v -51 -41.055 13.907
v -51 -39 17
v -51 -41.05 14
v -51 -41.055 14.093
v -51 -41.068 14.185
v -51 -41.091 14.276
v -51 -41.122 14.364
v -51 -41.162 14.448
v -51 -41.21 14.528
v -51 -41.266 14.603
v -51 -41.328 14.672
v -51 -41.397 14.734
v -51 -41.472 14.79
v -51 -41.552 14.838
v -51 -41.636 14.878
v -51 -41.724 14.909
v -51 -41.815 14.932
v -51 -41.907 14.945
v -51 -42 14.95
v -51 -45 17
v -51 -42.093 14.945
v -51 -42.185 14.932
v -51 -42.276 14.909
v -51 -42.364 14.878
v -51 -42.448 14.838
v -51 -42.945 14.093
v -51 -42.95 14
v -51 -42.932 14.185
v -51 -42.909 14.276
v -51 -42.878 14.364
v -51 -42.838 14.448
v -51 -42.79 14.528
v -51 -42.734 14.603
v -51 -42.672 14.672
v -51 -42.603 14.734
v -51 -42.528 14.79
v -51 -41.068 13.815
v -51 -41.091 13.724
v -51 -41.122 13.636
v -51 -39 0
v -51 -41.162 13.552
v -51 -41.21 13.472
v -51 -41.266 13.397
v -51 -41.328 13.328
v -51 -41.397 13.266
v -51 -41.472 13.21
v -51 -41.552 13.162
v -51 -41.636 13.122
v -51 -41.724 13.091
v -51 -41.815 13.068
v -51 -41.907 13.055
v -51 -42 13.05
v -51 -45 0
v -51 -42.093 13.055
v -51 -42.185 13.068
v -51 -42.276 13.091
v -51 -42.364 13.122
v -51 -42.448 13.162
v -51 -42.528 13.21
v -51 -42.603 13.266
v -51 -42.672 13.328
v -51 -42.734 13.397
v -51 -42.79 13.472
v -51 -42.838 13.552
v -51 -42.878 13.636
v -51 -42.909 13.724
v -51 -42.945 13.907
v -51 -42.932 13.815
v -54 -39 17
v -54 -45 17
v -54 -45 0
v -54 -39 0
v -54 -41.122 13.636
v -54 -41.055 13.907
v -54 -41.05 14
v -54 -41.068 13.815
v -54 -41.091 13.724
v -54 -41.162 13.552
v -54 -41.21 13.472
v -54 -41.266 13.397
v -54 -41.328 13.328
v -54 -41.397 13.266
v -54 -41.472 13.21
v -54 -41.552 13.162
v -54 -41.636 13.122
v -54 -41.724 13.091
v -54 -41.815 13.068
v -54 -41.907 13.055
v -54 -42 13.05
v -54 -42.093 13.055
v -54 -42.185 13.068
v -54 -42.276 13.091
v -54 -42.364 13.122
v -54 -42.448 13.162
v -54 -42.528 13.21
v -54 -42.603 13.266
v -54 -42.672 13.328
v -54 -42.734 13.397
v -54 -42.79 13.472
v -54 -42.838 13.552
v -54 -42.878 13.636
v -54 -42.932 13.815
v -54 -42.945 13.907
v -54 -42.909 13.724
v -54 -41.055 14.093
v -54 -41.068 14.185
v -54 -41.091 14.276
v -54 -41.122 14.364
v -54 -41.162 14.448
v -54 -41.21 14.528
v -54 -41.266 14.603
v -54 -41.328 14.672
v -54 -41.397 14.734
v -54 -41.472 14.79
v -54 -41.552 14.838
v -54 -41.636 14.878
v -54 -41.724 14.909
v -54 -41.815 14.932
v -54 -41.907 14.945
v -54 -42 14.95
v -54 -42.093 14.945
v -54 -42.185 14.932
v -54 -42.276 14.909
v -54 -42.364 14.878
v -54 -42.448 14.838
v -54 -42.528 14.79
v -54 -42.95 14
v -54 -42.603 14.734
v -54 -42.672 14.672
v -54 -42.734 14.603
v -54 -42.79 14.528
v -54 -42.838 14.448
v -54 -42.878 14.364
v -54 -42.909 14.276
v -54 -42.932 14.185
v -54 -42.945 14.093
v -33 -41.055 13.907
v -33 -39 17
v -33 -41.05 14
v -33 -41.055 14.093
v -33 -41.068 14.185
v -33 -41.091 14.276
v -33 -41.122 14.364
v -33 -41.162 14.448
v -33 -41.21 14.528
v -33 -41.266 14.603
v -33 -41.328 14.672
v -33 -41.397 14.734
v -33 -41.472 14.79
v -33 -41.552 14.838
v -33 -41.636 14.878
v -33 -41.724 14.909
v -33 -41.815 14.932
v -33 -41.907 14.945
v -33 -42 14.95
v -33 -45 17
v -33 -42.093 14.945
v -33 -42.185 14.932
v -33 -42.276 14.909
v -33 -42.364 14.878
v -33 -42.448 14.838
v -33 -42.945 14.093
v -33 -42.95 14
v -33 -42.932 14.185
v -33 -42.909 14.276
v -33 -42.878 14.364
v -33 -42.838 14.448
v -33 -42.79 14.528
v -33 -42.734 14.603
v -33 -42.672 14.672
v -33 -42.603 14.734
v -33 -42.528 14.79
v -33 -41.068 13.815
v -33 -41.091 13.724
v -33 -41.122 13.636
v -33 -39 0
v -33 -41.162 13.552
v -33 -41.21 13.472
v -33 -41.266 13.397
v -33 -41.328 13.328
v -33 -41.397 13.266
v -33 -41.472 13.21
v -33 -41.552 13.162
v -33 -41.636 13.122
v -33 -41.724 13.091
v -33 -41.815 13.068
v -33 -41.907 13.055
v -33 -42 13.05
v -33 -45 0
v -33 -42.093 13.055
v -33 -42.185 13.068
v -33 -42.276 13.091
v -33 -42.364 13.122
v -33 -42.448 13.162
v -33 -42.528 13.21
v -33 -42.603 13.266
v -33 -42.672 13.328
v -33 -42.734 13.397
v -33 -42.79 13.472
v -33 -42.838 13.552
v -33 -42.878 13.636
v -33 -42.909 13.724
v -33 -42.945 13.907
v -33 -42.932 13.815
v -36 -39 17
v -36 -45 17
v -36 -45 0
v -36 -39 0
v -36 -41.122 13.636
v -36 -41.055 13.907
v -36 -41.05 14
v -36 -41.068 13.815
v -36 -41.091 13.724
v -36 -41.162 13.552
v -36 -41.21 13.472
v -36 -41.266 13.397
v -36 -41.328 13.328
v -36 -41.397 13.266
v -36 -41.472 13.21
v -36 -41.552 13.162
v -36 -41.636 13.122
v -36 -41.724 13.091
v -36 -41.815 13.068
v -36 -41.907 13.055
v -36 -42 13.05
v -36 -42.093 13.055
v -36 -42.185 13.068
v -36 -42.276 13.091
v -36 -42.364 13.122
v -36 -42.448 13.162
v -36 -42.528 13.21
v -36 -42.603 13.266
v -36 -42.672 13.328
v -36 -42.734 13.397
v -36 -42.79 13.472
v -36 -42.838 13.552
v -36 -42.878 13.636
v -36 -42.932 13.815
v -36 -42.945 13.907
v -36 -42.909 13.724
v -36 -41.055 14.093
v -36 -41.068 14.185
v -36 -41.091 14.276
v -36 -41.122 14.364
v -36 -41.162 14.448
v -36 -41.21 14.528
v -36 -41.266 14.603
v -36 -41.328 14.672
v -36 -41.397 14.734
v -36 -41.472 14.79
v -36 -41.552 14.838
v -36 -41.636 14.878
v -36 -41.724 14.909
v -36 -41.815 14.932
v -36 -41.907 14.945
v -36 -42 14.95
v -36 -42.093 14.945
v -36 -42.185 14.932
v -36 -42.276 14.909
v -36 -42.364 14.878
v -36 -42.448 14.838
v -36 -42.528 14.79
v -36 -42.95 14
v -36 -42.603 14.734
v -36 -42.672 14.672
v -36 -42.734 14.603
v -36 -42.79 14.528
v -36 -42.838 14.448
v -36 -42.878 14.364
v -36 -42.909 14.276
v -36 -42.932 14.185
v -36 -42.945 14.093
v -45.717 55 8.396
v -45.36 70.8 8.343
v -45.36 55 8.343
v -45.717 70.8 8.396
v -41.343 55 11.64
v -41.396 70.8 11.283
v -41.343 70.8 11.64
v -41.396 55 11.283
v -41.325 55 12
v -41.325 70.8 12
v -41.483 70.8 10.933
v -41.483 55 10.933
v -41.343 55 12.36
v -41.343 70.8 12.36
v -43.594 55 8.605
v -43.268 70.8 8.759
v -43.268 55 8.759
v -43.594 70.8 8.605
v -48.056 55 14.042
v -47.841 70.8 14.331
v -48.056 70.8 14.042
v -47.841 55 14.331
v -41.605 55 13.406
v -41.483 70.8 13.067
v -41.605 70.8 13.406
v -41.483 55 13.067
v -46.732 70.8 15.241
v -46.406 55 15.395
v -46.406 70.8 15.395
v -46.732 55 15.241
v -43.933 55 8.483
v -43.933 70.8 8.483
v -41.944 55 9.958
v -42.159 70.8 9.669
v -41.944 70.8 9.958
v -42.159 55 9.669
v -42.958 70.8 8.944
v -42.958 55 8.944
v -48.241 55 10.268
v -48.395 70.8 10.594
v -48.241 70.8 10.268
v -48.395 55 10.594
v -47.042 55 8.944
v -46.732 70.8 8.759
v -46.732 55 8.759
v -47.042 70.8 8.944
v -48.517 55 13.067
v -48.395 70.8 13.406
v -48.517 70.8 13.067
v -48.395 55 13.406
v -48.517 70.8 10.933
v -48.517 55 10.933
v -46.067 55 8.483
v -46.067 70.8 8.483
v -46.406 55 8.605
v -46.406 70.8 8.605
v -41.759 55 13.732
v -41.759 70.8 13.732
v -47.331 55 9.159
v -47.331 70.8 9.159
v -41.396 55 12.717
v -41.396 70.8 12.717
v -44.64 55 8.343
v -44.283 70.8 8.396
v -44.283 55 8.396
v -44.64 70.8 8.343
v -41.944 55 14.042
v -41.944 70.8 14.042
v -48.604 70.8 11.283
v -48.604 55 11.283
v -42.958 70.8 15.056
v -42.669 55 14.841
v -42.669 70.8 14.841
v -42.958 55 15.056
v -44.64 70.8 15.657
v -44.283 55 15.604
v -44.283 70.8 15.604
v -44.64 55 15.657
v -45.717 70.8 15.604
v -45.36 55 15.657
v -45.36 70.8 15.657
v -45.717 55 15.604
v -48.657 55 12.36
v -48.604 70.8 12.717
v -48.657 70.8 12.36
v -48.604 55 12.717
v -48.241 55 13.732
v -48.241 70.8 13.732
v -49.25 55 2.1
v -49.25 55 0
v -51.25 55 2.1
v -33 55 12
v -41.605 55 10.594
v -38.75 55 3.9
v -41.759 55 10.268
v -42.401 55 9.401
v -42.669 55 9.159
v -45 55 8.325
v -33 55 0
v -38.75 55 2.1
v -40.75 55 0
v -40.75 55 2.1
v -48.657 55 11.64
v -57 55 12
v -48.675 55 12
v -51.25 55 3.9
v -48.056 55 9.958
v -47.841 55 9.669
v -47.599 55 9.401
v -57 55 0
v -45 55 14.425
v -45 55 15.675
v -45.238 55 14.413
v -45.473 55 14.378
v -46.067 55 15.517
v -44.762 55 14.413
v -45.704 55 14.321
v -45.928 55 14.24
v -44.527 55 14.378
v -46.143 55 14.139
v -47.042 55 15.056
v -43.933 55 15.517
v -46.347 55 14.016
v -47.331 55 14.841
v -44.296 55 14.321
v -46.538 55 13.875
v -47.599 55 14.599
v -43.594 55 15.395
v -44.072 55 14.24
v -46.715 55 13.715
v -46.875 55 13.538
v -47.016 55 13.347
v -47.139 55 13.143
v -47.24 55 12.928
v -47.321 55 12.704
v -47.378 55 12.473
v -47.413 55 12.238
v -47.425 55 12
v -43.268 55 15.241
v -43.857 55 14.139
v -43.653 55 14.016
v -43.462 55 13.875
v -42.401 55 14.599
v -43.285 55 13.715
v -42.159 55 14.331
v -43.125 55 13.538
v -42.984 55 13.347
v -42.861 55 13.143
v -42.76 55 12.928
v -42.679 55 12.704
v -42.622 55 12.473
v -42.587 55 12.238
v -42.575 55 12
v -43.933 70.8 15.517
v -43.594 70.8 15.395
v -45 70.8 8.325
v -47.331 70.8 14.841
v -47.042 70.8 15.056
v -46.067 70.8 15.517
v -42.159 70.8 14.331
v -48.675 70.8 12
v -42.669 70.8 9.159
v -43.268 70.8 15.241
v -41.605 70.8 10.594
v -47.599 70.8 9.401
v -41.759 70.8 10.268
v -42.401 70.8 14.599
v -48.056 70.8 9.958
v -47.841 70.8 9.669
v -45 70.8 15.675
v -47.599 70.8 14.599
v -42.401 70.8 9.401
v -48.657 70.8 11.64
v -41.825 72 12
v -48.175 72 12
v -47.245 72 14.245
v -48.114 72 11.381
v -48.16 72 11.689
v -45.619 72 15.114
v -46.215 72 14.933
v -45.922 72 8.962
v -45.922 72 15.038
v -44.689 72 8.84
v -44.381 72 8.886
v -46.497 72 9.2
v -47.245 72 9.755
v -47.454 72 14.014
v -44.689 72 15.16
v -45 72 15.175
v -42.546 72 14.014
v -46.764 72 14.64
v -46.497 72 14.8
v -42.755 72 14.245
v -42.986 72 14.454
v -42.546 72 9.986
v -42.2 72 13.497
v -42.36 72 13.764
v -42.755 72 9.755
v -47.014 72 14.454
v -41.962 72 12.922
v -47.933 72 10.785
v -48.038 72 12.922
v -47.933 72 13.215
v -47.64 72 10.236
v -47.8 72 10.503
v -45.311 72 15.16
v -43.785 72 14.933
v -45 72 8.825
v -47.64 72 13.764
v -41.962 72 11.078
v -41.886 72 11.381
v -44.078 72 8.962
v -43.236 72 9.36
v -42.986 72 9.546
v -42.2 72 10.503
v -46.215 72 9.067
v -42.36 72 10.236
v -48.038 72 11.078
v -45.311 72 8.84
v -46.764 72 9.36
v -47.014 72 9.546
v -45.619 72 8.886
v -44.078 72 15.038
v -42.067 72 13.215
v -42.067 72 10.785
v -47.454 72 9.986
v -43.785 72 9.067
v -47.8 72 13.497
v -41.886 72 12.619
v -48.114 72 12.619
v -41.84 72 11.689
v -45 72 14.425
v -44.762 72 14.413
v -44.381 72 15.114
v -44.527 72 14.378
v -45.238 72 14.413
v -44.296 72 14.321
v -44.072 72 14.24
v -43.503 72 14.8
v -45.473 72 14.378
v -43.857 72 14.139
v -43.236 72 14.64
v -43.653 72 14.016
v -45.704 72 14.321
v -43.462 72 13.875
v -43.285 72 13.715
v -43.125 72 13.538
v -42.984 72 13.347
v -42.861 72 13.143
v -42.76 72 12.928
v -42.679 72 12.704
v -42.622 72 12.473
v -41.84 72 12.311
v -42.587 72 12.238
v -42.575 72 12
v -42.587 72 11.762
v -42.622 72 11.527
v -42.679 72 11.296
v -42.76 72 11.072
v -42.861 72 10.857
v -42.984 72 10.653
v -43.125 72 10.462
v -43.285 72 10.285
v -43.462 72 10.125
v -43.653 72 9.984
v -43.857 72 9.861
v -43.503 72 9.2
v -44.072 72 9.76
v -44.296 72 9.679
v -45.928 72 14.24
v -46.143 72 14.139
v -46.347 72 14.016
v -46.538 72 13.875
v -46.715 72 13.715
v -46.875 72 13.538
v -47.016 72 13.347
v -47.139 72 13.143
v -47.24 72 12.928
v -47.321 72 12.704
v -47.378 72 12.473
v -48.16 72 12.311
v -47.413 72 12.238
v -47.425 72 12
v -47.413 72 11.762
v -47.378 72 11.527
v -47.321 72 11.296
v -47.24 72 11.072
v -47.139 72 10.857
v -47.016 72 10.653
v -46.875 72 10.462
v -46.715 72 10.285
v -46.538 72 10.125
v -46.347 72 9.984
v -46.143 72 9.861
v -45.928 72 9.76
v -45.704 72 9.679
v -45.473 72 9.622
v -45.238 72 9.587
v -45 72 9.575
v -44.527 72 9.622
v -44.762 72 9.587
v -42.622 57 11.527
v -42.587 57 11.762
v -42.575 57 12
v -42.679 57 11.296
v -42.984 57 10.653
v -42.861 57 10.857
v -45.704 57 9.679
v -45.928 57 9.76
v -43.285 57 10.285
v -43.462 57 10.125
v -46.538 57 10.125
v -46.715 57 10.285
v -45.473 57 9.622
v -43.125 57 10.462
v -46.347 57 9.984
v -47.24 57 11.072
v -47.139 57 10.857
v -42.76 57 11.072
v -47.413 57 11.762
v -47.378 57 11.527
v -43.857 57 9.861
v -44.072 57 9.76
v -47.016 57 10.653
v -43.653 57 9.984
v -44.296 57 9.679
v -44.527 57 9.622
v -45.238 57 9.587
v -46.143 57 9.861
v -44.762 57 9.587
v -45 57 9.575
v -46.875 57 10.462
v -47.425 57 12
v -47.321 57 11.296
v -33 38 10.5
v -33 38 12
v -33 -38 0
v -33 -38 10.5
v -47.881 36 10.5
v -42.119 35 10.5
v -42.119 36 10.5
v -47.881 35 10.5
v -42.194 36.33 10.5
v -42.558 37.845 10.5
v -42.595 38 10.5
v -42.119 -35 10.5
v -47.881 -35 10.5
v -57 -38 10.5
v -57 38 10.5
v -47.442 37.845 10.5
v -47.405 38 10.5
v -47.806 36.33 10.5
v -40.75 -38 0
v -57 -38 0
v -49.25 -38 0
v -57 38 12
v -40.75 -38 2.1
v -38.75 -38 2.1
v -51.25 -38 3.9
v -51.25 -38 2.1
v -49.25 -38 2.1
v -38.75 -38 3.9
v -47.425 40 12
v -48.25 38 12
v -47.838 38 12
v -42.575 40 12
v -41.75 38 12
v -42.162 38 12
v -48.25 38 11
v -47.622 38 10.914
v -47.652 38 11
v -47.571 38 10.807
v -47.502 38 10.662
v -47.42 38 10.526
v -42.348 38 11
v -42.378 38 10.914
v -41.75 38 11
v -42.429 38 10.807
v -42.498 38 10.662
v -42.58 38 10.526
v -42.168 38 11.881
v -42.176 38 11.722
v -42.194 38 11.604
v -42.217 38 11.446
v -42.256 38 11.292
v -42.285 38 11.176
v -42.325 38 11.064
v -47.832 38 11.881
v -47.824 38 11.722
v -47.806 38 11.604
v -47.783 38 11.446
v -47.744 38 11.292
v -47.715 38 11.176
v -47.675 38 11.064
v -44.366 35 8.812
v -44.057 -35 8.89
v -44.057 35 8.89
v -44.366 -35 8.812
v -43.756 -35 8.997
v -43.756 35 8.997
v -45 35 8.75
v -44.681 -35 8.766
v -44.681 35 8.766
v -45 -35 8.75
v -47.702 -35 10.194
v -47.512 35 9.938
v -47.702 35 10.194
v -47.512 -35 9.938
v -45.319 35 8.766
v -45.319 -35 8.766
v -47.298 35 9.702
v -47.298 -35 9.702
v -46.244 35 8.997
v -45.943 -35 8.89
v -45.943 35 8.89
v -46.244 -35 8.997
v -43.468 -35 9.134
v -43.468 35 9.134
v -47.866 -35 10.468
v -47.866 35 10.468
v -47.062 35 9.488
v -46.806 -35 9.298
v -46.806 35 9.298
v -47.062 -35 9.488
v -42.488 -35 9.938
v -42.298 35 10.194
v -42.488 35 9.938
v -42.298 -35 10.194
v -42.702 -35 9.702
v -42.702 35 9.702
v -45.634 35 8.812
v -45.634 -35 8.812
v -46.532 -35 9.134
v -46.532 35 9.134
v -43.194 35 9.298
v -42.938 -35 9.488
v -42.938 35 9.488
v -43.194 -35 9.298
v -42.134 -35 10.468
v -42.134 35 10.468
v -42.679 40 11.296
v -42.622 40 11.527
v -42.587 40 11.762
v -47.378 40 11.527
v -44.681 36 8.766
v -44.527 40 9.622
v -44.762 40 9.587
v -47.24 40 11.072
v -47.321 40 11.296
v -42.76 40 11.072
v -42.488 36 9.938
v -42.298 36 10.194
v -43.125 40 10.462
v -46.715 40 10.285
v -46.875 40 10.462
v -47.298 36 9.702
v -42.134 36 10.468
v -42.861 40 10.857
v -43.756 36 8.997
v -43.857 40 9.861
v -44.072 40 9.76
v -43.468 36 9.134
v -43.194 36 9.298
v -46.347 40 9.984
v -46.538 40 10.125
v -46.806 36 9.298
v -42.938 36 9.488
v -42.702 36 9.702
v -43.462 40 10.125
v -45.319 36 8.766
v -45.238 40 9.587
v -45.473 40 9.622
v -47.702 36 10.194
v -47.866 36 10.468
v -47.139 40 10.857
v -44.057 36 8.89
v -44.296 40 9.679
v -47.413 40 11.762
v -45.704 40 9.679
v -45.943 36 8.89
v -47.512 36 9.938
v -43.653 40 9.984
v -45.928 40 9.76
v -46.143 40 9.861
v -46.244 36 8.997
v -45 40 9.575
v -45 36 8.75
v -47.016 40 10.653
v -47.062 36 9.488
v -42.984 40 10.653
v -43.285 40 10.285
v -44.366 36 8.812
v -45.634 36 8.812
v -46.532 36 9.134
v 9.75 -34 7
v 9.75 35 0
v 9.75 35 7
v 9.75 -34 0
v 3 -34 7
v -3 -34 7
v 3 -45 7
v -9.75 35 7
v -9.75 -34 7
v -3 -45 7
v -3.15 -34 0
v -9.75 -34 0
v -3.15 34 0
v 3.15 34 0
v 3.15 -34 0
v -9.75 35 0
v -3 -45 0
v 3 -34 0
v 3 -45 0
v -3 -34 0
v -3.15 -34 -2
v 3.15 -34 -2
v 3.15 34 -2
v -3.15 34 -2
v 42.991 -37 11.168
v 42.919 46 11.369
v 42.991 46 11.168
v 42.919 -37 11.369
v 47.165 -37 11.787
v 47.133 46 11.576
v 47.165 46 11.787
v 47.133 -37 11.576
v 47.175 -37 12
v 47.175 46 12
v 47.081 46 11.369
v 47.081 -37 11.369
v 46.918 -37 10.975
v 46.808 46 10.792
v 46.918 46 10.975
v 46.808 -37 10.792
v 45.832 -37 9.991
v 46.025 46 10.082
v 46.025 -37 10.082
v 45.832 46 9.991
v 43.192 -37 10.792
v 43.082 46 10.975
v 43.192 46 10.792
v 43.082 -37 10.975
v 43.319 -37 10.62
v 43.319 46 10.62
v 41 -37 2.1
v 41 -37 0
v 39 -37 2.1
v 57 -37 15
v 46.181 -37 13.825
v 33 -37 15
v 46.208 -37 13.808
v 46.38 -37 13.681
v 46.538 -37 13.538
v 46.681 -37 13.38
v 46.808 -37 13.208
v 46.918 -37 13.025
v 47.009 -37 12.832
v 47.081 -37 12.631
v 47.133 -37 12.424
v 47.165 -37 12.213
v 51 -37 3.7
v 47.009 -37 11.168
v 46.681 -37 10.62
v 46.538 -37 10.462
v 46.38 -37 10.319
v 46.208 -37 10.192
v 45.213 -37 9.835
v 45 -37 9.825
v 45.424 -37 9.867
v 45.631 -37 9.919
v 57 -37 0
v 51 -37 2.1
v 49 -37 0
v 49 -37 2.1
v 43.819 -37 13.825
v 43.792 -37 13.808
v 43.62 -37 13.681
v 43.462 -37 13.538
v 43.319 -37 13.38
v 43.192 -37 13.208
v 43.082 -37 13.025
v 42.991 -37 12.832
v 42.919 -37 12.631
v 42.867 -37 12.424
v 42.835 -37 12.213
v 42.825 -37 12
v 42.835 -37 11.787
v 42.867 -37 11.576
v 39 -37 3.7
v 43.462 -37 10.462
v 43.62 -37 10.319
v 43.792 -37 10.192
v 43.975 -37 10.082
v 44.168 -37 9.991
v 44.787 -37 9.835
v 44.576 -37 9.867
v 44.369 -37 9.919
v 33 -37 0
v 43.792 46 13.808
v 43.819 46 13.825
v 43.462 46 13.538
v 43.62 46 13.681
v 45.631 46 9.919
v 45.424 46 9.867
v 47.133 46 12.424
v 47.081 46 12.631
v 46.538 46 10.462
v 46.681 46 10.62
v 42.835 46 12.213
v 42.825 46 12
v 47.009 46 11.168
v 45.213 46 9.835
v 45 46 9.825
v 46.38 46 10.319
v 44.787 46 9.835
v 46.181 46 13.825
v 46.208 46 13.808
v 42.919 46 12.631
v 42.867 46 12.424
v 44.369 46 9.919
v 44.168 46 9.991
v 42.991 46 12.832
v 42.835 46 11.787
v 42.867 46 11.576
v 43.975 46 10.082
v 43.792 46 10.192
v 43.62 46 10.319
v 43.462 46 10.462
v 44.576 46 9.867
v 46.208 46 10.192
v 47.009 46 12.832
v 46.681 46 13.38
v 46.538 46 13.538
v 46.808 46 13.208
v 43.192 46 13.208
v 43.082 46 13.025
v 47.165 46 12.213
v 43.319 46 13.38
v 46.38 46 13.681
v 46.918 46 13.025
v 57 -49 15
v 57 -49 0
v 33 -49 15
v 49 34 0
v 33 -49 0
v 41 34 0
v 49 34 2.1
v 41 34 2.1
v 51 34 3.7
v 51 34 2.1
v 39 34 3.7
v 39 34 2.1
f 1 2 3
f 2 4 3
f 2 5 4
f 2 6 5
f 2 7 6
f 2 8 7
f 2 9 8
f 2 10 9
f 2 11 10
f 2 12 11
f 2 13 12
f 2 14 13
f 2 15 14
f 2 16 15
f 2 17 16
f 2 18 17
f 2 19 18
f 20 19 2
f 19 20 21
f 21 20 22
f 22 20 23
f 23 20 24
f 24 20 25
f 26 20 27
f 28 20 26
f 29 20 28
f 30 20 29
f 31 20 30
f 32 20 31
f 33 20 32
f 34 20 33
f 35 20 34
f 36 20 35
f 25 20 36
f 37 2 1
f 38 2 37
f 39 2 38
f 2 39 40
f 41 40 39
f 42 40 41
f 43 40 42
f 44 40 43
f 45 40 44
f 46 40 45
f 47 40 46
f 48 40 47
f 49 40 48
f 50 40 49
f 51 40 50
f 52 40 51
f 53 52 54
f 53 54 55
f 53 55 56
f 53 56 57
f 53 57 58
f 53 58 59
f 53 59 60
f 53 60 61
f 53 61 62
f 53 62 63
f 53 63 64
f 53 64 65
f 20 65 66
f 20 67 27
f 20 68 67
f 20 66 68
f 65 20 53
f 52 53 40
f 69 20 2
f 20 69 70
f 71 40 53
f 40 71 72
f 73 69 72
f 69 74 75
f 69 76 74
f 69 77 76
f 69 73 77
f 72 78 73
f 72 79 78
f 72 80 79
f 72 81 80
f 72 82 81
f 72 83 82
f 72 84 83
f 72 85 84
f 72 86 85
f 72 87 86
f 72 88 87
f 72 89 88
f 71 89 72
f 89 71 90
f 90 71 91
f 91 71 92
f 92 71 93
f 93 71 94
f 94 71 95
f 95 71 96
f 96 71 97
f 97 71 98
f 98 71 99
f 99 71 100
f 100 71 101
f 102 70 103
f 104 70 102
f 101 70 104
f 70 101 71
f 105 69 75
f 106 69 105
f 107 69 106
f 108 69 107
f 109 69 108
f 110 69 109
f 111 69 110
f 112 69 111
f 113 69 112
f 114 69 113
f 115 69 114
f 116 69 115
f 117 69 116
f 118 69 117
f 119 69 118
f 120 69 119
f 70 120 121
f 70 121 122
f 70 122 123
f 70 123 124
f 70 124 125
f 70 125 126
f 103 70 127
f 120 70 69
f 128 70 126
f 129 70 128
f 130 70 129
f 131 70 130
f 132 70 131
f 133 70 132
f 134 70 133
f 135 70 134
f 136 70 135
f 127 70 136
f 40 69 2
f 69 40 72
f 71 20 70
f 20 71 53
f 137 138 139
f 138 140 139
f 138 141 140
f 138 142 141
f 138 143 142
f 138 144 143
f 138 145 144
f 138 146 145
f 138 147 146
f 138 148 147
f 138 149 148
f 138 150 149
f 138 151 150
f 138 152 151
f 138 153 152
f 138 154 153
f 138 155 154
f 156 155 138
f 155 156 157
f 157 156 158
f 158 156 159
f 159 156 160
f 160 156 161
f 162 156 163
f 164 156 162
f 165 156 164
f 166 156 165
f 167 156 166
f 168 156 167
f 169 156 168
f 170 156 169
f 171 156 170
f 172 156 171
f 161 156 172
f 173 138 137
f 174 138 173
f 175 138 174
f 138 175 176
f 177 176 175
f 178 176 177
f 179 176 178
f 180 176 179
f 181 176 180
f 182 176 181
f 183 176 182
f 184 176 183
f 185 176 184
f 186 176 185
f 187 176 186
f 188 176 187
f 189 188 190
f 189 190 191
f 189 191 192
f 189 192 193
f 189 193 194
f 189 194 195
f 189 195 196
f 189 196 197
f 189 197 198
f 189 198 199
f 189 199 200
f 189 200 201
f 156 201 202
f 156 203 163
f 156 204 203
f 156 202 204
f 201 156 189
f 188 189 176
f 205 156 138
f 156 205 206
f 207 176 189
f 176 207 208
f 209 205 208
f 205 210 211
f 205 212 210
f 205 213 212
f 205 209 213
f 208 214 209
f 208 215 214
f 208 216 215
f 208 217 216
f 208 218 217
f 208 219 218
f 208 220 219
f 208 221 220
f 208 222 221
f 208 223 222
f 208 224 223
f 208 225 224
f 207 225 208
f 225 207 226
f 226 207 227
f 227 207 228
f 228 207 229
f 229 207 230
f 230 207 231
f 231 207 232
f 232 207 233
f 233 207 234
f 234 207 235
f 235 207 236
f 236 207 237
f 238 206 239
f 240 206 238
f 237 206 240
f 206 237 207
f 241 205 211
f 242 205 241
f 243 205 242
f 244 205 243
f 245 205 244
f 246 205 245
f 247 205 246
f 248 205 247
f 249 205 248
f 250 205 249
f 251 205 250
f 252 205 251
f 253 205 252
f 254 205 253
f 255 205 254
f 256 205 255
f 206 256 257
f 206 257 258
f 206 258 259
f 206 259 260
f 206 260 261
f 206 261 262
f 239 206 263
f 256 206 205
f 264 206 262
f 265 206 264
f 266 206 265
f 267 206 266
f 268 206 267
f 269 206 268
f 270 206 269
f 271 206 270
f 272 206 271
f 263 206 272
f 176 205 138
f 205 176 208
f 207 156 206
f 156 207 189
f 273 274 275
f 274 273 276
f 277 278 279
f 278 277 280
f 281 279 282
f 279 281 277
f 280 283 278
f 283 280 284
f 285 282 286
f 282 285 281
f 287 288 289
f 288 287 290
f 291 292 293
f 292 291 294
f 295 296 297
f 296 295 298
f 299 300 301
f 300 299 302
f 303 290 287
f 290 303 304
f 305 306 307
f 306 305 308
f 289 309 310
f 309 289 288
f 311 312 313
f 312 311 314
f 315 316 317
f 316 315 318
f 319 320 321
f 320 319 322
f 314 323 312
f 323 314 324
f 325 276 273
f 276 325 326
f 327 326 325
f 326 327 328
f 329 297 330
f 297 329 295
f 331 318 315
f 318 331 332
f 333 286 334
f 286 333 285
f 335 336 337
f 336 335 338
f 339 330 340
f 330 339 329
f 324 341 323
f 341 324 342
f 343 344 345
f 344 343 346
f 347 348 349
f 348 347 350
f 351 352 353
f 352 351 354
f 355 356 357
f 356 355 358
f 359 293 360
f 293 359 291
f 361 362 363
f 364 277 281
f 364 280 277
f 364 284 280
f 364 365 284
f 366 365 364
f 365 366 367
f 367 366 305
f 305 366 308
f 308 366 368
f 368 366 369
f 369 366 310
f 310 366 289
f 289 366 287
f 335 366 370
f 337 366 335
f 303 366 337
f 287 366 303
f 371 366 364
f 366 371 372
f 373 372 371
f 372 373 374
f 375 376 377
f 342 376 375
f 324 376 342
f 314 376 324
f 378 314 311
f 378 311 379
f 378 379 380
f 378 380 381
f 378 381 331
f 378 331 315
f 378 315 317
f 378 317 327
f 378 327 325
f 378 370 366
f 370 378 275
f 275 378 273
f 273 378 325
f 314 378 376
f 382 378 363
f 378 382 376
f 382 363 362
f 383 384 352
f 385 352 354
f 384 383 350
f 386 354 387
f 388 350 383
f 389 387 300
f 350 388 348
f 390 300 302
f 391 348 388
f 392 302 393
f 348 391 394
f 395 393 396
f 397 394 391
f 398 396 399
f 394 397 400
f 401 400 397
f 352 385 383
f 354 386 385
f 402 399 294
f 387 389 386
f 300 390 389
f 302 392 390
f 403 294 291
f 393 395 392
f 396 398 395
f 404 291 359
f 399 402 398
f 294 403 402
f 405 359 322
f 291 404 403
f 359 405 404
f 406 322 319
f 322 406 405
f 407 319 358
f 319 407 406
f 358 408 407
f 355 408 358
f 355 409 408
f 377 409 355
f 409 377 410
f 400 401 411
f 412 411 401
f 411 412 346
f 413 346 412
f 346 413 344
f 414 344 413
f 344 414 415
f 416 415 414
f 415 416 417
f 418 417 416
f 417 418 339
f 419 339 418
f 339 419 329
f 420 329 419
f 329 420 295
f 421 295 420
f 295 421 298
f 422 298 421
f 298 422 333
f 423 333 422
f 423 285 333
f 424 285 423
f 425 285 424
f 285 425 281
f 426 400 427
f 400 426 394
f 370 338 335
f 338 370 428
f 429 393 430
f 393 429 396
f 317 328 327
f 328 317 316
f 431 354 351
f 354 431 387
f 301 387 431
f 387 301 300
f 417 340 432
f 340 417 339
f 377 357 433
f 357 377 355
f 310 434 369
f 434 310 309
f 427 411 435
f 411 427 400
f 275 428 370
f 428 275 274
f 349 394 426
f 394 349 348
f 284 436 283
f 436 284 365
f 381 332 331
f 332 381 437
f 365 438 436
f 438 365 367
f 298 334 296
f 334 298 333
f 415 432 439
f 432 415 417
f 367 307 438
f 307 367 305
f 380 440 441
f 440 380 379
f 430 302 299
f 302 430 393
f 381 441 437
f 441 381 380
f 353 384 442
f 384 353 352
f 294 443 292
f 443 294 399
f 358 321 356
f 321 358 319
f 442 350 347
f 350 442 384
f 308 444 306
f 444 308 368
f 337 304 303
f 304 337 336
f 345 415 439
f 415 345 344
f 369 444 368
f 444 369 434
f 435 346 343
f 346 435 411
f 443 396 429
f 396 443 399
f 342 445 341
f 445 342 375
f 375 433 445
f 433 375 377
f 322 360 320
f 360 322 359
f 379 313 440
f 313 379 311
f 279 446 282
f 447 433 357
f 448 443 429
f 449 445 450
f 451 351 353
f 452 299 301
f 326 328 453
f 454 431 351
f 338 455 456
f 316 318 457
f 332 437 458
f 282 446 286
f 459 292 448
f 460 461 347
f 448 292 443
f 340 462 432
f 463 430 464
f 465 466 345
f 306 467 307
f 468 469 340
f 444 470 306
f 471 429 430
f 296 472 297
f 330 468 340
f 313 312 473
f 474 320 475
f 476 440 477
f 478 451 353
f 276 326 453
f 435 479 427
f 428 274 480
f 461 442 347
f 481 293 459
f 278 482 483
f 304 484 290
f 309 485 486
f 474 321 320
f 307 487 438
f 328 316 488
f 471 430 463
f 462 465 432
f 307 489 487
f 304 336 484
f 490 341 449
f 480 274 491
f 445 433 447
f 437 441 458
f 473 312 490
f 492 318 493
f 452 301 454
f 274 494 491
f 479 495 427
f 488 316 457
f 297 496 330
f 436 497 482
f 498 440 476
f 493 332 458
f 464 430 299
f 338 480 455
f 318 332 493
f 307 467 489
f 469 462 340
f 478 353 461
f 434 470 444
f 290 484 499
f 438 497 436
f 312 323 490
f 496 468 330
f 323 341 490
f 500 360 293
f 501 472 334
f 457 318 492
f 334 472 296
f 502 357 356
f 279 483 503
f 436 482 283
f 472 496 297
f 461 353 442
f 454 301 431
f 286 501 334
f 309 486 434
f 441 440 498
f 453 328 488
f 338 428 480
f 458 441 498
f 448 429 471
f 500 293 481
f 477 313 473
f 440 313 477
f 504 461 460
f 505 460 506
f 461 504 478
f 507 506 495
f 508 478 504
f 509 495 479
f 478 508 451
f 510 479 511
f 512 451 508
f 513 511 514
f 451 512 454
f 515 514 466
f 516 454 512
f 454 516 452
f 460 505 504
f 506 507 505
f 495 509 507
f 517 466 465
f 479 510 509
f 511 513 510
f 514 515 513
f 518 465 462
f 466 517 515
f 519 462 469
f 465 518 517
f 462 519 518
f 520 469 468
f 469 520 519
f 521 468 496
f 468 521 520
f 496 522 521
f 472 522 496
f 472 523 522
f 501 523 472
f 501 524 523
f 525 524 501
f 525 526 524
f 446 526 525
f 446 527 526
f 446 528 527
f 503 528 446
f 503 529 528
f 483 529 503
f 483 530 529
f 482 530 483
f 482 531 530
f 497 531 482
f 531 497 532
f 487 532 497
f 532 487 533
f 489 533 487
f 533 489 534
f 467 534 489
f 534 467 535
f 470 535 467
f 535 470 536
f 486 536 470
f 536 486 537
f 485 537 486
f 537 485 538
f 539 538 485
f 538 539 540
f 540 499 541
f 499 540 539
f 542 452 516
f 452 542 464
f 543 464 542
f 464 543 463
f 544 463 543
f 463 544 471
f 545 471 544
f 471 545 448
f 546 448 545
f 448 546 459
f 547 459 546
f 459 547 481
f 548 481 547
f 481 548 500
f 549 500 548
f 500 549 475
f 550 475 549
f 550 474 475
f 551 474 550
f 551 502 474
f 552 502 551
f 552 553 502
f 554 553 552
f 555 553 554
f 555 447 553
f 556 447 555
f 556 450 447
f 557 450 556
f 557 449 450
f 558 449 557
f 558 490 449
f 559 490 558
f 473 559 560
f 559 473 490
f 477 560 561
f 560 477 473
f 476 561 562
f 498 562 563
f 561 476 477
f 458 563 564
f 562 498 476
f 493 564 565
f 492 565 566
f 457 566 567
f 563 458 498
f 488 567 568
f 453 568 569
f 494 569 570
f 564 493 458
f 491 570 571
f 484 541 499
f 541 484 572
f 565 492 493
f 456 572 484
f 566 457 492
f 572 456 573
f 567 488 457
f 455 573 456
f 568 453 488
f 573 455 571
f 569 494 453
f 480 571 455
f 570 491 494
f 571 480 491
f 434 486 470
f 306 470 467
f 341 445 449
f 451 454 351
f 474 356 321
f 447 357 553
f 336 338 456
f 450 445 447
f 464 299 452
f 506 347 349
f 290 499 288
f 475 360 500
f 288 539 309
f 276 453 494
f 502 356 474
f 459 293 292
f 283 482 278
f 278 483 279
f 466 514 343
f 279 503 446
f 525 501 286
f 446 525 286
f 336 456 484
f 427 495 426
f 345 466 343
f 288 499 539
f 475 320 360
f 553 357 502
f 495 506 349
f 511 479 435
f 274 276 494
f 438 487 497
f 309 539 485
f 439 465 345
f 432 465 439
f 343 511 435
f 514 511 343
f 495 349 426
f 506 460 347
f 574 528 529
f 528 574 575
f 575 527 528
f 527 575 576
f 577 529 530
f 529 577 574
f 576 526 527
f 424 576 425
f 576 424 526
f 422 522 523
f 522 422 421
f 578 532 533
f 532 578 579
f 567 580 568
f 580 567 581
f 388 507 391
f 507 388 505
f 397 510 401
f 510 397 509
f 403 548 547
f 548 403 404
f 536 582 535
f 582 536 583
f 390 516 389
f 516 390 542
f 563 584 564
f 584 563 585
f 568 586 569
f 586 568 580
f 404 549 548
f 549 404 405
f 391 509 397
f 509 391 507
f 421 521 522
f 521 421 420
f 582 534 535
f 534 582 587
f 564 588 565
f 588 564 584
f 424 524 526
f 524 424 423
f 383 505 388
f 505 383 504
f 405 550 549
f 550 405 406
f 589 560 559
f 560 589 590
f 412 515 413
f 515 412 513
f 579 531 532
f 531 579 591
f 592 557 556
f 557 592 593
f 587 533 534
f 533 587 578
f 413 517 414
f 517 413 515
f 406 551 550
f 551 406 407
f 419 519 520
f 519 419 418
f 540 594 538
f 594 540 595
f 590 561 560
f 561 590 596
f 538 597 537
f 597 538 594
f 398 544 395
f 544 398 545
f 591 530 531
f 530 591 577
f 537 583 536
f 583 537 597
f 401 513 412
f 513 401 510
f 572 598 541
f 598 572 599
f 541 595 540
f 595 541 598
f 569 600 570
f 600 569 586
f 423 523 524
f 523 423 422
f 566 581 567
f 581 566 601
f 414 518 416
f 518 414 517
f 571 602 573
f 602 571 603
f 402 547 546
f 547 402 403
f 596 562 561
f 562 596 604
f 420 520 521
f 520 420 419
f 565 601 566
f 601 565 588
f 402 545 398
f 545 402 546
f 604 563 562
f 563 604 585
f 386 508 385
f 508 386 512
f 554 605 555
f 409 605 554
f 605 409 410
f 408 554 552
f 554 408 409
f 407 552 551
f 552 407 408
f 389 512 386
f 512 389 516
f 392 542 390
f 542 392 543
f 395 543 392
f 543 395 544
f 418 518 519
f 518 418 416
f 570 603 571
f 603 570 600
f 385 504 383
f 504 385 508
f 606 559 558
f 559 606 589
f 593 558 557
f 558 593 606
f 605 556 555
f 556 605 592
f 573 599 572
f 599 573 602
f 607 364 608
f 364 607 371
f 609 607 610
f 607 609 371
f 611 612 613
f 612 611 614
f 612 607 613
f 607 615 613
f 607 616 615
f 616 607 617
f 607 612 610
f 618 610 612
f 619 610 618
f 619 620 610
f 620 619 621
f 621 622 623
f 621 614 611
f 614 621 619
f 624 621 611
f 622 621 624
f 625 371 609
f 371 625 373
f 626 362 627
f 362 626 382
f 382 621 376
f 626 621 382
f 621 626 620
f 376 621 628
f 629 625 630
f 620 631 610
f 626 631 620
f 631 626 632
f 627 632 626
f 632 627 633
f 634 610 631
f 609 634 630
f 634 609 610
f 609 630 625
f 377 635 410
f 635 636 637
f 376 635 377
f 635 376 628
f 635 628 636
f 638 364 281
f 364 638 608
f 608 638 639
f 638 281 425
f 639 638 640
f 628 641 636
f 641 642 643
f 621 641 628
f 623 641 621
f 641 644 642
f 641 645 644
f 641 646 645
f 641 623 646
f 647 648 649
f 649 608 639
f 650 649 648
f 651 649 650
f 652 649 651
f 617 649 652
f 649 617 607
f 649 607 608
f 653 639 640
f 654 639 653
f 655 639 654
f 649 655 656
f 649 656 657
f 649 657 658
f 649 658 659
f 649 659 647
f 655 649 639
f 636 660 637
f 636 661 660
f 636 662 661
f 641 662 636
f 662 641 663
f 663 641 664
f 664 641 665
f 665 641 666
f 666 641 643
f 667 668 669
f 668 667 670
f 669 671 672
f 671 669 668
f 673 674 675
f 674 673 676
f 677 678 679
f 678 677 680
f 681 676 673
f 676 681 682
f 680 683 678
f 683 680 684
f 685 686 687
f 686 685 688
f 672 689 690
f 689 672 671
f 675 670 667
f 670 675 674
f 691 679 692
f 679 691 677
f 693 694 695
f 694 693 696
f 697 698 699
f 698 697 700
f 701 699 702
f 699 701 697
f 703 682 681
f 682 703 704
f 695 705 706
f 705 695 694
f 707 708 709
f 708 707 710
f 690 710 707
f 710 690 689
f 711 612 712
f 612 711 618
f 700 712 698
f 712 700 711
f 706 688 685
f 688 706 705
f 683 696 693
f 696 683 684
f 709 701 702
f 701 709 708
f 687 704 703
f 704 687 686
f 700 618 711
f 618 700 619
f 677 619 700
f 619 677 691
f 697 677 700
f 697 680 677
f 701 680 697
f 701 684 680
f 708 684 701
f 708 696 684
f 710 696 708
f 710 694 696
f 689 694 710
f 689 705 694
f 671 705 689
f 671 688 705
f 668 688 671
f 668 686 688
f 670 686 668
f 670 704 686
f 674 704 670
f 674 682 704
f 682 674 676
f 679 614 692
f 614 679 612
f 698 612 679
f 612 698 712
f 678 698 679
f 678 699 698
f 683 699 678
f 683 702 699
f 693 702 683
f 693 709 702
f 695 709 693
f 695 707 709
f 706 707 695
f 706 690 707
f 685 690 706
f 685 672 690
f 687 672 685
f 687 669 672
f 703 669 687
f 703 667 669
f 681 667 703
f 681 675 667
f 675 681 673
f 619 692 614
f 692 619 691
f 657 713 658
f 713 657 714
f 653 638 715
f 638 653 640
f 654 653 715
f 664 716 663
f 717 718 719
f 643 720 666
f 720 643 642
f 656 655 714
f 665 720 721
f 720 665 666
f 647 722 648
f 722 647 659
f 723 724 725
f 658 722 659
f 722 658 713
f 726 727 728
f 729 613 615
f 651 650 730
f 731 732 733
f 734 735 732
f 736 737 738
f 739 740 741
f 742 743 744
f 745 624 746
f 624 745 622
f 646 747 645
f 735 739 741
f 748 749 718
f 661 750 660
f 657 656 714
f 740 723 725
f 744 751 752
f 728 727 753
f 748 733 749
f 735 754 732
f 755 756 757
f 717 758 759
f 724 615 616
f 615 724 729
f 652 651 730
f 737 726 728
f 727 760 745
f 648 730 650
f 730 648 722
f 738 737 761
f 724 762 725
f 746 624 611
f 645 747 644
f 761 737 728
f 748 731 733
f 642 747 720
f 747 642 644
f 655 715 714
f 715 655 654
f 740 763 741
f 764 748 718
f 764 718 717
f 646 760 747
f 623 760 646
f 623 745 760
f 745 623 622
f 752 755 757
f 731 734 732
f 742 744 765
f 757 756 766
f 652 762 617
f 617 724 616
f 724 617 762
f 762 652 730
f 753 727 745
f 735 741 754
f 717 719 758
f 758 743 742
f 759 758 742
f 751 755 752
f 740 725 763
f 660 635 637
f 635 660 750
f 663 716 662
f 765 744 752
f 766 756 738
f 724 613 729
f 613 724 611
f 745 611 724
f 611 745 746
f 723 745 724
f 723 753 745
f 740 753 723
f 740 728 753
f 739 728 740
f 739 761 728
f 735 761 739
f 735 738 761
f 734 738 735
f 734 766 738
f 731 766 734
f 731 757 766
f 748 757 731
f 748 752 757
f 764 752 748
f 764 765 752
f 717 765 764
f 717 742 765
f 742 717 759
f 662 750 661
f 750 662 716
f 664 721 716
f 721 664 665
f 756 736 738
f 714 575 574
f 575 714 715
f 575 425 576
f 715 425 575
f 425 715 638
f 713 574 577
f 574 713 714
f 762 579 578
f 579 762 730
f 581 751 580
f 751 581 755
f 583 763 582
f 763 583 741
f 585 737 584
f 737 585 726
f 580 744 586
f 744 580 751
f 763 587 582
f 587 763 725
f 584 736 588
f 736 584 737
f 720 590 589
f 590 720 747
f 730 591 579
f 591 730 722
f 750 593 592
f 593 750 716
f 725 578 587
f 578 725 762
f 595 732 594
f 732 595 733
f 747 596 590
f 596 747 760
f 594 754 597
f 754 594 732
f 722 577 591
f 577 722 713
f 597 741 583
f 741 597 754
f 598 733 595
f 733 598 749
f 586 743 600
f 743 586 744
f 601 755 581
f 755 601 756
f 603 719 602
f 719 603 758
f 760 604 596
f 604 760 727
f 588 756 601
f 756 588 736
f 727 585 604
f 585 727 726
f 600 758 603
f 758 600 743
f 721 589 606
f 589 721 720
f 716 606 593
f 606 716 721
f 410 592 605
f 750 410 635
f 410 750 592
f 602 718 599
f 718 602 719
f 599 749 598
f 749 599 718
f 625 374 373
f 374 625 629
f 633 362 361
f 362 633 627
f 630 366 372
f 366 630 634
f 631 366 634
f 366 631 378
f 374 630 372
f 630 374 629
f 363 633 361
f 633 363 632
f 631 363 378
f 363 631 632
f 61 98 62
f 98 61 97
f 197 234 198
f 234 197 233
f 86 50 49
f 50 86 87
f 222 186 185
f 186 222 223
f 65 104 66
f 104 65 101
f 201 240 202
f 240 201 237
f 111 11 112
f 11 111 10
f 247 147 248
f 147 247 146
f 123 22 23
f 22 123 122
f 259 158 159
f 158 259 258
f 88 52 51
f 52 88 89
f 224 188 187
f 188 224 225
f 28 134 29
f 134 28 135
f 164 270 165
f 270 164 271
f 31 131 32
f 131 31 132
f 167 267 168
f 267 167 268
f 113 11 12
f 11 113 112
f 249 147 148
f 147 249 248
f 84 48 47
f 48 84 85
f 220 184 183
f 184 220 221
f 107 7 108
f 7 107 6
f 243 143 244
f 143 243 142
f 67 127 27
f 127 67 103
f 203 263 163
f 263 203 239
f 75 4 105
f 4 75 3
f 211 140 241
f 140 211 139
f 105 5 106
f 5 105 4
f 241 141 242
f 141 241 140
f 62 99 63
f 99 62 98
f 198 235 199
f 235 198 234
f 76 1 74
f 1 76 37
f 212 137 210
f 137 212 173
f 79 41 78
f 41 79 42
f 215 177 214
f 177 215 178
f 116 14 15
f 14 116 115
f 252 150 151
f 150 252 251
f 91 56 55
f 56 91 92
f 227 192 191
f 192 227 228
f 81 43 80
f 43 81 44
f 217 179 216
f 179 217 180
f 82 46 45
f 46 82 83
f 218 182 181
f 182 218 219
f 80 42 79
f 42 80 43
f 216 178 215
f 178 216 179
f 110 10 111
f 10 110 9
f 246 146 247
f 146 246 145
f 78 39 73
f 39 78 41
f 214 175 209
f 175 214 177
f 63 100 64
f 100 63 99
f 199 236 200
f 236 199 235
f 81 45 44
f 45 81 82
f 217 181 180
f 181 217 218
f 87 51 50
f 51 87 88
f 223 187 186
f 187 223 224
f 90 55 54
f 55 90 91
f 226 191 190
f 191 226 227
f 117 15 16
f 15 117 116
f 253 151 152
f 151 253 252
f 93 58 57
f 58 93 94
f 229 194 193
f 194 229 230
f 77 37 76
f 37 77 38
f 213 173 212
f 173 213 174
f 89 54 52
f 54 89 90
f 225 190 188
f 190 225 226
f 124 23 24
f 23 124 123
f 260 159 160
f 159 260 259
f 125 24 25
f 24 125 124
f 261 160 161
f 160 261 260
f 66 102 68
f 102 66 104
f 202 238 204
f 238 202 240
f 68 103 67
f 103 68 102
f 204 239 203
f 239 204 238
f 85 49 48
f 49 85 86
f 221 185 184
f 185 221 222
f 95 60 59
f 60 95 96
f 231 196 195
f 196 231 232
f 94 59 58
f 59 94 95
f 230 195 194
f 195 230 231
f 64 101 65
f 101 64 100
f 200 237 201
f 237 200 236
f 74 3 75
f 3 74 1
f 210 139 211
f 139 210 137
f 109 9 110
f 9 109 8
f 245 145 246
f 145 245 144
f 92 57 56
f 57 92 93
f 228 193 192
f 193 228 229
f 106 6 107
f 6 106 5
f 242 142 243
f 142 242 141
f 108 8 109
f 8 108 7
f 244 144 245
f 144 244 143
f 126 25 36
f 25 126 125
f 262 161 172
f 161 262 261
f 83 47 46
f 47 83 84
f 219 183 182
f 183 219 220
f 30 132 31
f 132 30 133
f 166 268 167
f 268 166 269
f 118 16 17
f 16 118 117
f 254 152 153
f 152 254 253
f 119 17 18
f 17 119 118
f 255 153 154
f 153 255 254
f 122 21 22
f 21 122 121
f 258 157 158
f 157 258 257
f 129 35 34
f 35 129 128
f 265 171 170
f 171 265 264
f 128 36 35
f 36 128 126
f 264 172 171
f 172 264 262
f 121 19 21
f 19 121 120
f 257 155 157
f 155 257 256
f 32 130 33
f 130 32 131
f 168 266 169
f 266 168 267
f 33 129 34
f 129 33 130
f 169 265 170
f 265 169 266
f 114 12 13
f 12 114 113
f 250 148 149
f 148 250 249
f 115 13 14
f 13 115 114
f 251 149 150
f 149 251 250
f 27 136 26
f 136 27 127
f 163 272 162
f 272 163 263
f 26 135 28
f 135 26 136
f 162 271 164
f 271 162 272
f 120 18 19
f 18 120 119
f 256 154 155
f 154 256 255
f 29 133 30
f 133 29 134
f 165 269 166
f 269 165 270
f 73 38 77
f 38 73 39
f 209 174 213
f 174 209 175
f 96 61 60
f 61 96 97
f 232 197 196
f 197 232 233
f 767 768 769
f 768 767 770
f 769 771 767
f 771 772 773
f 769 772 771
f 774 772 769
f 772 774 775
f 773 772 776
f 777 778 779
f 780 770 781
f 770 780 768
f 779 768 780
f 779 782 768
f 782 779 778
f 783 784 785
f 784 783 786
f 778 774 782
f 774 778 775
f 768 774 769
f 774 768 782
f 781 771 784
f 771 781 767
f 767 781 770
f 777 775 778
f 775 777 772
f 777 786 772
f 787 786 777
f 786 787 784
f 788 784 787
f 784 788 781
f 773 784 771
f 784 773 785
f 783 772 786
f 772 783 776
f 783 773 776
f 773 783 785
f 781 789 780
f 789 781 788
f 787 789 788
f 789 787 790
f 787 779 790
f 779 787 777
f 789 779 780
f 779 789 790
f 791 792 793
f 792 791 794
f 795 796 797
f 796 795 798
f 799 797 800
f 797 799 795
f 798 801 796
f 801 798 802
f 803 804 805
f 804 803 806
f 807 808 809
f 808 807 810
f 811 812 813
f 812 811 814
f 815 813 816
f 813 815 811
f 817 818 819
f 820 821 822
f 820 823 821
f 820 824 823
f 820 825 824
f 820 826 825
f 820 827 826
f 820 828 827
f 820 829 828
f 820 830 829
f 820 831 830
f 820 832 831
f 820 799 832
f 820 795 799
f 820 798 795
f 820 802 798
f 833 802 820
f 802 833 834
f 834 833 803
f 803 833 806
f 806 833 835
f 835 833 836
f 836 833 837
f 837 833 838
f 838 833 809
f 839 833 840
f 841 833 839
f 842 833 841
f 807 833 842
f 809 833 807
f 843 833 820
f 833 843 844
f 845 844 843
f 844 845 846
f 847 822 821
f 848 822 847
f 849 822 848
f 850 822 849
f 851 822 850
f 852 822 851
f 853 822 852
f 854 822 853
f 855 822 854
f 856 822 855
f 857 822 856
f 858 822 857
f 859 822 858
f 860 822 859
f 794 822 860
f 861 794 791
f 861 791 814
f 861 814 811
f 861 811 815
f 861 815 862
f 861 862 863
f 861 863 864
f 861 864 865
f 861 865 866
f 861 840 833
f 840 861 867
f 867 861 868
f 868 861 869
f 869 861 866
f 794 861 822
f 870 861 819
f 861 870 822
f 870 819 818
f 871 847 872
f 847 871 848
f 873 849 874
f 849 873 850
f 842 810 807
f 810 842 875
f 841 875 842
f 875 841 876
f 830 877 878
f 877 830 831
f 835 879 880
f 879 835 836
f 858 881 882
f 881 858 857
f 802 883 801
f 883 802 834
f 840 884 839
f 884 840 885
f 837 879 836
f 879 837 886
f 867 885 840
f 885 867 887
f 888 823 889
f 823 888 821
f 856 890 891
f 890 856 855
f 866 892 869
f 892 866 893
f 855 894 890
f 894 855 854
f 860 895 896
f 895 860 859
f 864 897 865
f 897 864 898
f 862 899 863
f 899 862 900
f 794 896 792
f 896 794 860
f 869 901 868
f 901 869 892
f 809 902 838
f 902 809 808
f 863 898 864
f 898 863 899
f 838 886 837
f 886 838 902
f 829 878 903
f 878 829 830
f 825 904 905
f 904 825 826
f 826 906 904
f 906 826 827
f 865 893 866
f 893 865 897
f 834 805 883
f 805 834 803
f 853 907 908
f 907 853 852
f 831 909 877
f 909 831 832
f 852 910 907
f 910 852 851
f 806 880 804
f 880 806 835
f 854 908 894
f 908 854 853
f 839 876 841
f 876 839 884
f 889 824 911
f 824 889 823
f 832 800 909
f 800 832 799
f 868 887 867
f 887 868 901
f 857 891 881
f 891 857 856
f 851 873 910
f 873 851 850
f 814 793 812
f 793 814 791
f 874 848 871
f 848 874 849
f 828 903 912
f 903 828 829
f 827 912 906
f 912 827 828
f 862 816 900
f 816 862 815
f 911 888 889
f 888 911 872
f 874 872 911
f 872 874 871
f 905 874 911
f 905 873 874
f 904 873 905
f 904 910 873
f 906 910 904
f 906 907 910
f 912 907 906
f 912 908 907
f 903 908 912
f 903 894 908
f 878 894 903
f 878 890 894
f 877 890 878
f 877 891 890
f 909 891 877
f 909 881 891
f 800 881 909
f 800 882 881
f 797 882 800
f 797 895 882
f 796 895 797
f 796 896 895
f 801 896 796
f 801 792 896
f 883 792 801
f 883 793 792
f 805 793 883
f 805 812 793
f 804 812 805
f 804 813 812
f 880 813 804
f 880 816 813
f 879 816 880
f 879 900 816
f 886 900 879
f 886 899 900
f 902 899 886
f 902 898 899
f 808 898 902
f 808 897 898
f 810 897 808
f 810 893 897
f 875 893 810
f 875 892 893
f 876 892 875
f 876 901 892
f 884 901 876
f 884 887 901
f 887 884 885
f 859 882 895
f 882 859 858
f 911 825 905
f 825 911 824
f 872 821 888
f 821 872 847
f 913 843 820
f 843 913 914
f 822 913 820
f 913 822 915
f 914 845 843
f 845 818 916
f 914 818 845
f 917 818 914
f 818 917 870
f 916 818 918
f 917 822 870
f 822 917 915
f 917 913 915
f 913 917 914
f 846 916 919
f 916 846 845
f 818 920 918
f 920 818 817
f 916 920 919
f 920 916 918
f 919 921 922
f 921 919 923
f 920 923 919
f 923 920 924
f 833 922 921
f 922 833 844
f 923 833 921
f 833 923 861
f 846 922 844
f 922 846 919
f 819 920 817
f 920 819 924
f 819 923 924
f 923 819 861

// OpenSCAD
// =========================================================
// INJETOR MANUAL BASCULANTE - KING SIZE (84mm x 8mm)
// REV. 6 - CORRIGIDO E AUDITADO (EIXOS, DOBRADIÇA E TRILHO)
// =========================================================

$fn = 64; // Resolução otimizada para gerar o STL rápido

// --- PARÂMETROS DE MERCADO E TOLERÂNCIA ---
comp_total_tubo  = 84.0;
comp_filtro      = 16.0;
comp_camara      = comp_total_tubo - comp_filtro; // 68.0 mm

diam_tubo_ext    = 8.0;
diam_bico_ext    = 7.35; // Folga para o tubo de 8mm
esp_parede_bico  = 1.25;
diam_furo_bico   = diam_bico_ext - (2 * esp_parede_bico); // 4.85 mm

comp_bico        = 17.0;
folga_movel      = 0.25; // Folga segura para impressão FDM

// --- DIMENSÕES DO CORPO E CÂMARA ---
larg_corpo       = 24.0;
alt_base_camara  = 12.0;
diam_camara_fumo = 6.5;   // Câmara de fumo levemente maior que o bico
curso_pistao     = comp_camara + comp_bico - 2.0; 

// --- DOBRADIÇA TRASEIRA ---
diam_pino_eixo   = 1.9;   // Para passar filamento 1.75mm (com folga)
y_eixo_hinge     = -comp_camara/2 - 8.0;
z_eixo_hinge     = alt_base_camara + 2.0; // Altura em relação a Z=0

// --- SELETOR DE PEÇA ("todas", "base", "tampa", "pistao") ---
peca = "todas";

if (peca == "todas") {
    translate([-45, 0, 0]) base_basculante();
    translate([0, 0, 0])   tampa_articulada();
    translate([45, 0, 0])  pistao_linear();
} else if (peca == "base") {
    base_basculante();
} else if (peca == "tampa") {
    tampa_articulada();
} else if (peca == "pistao") {
    pistao_linear();
}

// =========================================================
// 1. BASE: BICO INTEGRADO, CALHA DE FURO E TRILHO
// =========================================================
module base_basculante() {
    y_ini = -comp_camara / 2;
    y_fim =  comp_camara / 2;

    difference() {
        union() {
            // Corpo principal (fundo até a metade da câmara)
            translate([-larg_corpo/2, y_ini - 4, 0])
                cube([larg_corpo, comp_camara + comp_bico + 8, alt_base_camara - 1.5]);

            // Corpo frontal do bico (integrado à base)
            translate([-larg_corpo/2, y_fim + 4, 0])
                cube([larg_corpo, comp_bico, alt_base_camara]);

            // Orelhas laterais traseiras para a dobradiça
            for (lado = [-1, 1]) {
                translate([lado * (larg_corpo/2 - 3), y_eixo_hinge - 3, 0])
                    cube([3, 6, z_eixo_hinge + 3]);
            }
            
            // Bico frontal (ponta cônica/reta) unificado à base
            translate([0, y_fim + comp_bico + 4, alt_base_camara])
                rotate([-90, 0, 0])
                    bico_com_chanfro(comp_bico, diam_bico_ext, diam_furo_bico);
        }

        // Calha de fumo (aberta no topo)
        translate([0, y_ini - 1, alt_base_camara])
            rotate([-90, 0, 0])
                cylinder(h = comp_camara + 2, d = diam_camara_fumo);

        // Abertura superior para o fumo descer
        translate([-diam_camara_fumo/2, y_ini - 4, alt_base_camara - 1.0])
            cube([diam_camara_fumo, comp_camara + 8, 5.0]);

        // Funil de transição (da câmara de 6.5mm para o furo do bico de 4.85mm)
        translate([0, y_fim + 2, alt_base_camara])
            rotate([-90, 0, 0])
                cylinder(h = 4.0, d1 = diam_camara_fumo, d2 = diam_furo_bico);

        // Furo passante do bico
        translate([0, y_fim + 2, alt_base_camara])
            rotate([-90, 0, 0])
                cylinder(h = comp_bico + 4, d = diam_furo_bico);

        // Trilho guia (T invertido)
        translate([-(8 + 2*folga_movel)/2, y_ini - 4, -0.1])
            cube([8 + 2*folga_movel, comp_camara + comp_bico + 8, 2.5]);
        translate([-(12 + 2*folga_movel)/2, y_ini - 4, 2.1])
            cube([12 + 2*folga_movel, comp_camara + comp_bico + 8, 1.8]);

        // Furo passante do eixo da dobradiça (atravessa as duas orelhas)
        translate([-larg_corpo, y_eixo_hinge, z_eixo_hinge])
            rotate([0, 90, 0])
                cylinder(h = larg_corpo * 2, d = diam_pino_eixo);
    }
}

module bico_com_chanfro(comp, d_ext, d_int) {
    chanfro = 1.2;
    difference() {
        union() {
            cylinder(h = comp - chanfro, d = d_ext);
            translate([0, 0, comp - chanfro])
                cylinder(h = chanfro, d1 = d_ext, d2 = d_ext - 1.0);
        }
        translate([0, 0, -0.2])
            cylinder(h = comp + 0.5, d = d_int);
    }
}

// =========================================================
// 2. TAMPA ARTICULADA (LÍNGUA DE PRENSAR)
// =========================================================
module tampa_articulada() {
    y_ini = -comp_camara / 2;
    larg_miolo = larg_corpo - 4 - 2*folga_movel;
    alt_tampa = 7.0;

    difference() {
        union() {
            // Corpo da tampa
            translate([-larg_miolo/2, y_ini, 0])
                cube([larg_miolo, comp_camara + 1.0, alt_tampa]);

            // Braço da dobradiça
            translate([-3, y_eixo_hinge - 3, 0])
                cube([6, abs(y_ini - (y_eixo_hinge - 3)), alt_tampa]);

            // Língua de prensar o fumo (desce dentro da calha da base)
            translate([-diam_camara_fumo/2 + 0.1, y_ini, -2.0])
                cube([diam_camara_fumo - 0.2, comp_camara, 3.0]);
        }

        // Furo passante da dobradiça no braço da tampa
        translate([-5, y_eixo_hinge, z_eixo_hinge])
            rotate([0, 90, 0])
                cylinder(h = 10, d = diam_pino_eixo);
    }
}

// =========================================================
// 3. PISTÃO LINEAR (HASTE E TRILHO)
// =========================================================
module pistao_linear() {
    y_ini = -comp_camara / 2;
    diam_haste = diam_furo_bico - (2 * folga_movel);

    union() {
        // Bloco traseiro
        translate([-larg_corpo/2, y_ini - 15, 0])
            cube([larg_corpo, 12, alt_base_camara + 3]);

        // Guia inferior (encaixa no trilho T da base)
        translate([-4.0, y_ini - 15, 0])
            cube([8.0, comp_camara + 15, 2.4]);
        translate([-6.0, y_ini - 15, 2.1])
            cube([12.0, comp_camara + 15, 1.6]);

        // Haste cilíndrica (passa pelo funil e pelo bico)
        translate([0, y_ini - 3, alt_base_camara])
            rotate([-90, 0, 0])
                haste_anti_oval(curso_pistao, diam_haste);
    }
}

module haste_anti_oval(comp, diam) {
    r = diam / 2;
    intersection() {
        cylinder(h = comp, d = diam);
        // Corte para base plana na mesa
        translate([-r - 1, -r + 0.35, -0.1])
            cube([diam + 2, diam + 1, comp + 0.2]);
    }
}
